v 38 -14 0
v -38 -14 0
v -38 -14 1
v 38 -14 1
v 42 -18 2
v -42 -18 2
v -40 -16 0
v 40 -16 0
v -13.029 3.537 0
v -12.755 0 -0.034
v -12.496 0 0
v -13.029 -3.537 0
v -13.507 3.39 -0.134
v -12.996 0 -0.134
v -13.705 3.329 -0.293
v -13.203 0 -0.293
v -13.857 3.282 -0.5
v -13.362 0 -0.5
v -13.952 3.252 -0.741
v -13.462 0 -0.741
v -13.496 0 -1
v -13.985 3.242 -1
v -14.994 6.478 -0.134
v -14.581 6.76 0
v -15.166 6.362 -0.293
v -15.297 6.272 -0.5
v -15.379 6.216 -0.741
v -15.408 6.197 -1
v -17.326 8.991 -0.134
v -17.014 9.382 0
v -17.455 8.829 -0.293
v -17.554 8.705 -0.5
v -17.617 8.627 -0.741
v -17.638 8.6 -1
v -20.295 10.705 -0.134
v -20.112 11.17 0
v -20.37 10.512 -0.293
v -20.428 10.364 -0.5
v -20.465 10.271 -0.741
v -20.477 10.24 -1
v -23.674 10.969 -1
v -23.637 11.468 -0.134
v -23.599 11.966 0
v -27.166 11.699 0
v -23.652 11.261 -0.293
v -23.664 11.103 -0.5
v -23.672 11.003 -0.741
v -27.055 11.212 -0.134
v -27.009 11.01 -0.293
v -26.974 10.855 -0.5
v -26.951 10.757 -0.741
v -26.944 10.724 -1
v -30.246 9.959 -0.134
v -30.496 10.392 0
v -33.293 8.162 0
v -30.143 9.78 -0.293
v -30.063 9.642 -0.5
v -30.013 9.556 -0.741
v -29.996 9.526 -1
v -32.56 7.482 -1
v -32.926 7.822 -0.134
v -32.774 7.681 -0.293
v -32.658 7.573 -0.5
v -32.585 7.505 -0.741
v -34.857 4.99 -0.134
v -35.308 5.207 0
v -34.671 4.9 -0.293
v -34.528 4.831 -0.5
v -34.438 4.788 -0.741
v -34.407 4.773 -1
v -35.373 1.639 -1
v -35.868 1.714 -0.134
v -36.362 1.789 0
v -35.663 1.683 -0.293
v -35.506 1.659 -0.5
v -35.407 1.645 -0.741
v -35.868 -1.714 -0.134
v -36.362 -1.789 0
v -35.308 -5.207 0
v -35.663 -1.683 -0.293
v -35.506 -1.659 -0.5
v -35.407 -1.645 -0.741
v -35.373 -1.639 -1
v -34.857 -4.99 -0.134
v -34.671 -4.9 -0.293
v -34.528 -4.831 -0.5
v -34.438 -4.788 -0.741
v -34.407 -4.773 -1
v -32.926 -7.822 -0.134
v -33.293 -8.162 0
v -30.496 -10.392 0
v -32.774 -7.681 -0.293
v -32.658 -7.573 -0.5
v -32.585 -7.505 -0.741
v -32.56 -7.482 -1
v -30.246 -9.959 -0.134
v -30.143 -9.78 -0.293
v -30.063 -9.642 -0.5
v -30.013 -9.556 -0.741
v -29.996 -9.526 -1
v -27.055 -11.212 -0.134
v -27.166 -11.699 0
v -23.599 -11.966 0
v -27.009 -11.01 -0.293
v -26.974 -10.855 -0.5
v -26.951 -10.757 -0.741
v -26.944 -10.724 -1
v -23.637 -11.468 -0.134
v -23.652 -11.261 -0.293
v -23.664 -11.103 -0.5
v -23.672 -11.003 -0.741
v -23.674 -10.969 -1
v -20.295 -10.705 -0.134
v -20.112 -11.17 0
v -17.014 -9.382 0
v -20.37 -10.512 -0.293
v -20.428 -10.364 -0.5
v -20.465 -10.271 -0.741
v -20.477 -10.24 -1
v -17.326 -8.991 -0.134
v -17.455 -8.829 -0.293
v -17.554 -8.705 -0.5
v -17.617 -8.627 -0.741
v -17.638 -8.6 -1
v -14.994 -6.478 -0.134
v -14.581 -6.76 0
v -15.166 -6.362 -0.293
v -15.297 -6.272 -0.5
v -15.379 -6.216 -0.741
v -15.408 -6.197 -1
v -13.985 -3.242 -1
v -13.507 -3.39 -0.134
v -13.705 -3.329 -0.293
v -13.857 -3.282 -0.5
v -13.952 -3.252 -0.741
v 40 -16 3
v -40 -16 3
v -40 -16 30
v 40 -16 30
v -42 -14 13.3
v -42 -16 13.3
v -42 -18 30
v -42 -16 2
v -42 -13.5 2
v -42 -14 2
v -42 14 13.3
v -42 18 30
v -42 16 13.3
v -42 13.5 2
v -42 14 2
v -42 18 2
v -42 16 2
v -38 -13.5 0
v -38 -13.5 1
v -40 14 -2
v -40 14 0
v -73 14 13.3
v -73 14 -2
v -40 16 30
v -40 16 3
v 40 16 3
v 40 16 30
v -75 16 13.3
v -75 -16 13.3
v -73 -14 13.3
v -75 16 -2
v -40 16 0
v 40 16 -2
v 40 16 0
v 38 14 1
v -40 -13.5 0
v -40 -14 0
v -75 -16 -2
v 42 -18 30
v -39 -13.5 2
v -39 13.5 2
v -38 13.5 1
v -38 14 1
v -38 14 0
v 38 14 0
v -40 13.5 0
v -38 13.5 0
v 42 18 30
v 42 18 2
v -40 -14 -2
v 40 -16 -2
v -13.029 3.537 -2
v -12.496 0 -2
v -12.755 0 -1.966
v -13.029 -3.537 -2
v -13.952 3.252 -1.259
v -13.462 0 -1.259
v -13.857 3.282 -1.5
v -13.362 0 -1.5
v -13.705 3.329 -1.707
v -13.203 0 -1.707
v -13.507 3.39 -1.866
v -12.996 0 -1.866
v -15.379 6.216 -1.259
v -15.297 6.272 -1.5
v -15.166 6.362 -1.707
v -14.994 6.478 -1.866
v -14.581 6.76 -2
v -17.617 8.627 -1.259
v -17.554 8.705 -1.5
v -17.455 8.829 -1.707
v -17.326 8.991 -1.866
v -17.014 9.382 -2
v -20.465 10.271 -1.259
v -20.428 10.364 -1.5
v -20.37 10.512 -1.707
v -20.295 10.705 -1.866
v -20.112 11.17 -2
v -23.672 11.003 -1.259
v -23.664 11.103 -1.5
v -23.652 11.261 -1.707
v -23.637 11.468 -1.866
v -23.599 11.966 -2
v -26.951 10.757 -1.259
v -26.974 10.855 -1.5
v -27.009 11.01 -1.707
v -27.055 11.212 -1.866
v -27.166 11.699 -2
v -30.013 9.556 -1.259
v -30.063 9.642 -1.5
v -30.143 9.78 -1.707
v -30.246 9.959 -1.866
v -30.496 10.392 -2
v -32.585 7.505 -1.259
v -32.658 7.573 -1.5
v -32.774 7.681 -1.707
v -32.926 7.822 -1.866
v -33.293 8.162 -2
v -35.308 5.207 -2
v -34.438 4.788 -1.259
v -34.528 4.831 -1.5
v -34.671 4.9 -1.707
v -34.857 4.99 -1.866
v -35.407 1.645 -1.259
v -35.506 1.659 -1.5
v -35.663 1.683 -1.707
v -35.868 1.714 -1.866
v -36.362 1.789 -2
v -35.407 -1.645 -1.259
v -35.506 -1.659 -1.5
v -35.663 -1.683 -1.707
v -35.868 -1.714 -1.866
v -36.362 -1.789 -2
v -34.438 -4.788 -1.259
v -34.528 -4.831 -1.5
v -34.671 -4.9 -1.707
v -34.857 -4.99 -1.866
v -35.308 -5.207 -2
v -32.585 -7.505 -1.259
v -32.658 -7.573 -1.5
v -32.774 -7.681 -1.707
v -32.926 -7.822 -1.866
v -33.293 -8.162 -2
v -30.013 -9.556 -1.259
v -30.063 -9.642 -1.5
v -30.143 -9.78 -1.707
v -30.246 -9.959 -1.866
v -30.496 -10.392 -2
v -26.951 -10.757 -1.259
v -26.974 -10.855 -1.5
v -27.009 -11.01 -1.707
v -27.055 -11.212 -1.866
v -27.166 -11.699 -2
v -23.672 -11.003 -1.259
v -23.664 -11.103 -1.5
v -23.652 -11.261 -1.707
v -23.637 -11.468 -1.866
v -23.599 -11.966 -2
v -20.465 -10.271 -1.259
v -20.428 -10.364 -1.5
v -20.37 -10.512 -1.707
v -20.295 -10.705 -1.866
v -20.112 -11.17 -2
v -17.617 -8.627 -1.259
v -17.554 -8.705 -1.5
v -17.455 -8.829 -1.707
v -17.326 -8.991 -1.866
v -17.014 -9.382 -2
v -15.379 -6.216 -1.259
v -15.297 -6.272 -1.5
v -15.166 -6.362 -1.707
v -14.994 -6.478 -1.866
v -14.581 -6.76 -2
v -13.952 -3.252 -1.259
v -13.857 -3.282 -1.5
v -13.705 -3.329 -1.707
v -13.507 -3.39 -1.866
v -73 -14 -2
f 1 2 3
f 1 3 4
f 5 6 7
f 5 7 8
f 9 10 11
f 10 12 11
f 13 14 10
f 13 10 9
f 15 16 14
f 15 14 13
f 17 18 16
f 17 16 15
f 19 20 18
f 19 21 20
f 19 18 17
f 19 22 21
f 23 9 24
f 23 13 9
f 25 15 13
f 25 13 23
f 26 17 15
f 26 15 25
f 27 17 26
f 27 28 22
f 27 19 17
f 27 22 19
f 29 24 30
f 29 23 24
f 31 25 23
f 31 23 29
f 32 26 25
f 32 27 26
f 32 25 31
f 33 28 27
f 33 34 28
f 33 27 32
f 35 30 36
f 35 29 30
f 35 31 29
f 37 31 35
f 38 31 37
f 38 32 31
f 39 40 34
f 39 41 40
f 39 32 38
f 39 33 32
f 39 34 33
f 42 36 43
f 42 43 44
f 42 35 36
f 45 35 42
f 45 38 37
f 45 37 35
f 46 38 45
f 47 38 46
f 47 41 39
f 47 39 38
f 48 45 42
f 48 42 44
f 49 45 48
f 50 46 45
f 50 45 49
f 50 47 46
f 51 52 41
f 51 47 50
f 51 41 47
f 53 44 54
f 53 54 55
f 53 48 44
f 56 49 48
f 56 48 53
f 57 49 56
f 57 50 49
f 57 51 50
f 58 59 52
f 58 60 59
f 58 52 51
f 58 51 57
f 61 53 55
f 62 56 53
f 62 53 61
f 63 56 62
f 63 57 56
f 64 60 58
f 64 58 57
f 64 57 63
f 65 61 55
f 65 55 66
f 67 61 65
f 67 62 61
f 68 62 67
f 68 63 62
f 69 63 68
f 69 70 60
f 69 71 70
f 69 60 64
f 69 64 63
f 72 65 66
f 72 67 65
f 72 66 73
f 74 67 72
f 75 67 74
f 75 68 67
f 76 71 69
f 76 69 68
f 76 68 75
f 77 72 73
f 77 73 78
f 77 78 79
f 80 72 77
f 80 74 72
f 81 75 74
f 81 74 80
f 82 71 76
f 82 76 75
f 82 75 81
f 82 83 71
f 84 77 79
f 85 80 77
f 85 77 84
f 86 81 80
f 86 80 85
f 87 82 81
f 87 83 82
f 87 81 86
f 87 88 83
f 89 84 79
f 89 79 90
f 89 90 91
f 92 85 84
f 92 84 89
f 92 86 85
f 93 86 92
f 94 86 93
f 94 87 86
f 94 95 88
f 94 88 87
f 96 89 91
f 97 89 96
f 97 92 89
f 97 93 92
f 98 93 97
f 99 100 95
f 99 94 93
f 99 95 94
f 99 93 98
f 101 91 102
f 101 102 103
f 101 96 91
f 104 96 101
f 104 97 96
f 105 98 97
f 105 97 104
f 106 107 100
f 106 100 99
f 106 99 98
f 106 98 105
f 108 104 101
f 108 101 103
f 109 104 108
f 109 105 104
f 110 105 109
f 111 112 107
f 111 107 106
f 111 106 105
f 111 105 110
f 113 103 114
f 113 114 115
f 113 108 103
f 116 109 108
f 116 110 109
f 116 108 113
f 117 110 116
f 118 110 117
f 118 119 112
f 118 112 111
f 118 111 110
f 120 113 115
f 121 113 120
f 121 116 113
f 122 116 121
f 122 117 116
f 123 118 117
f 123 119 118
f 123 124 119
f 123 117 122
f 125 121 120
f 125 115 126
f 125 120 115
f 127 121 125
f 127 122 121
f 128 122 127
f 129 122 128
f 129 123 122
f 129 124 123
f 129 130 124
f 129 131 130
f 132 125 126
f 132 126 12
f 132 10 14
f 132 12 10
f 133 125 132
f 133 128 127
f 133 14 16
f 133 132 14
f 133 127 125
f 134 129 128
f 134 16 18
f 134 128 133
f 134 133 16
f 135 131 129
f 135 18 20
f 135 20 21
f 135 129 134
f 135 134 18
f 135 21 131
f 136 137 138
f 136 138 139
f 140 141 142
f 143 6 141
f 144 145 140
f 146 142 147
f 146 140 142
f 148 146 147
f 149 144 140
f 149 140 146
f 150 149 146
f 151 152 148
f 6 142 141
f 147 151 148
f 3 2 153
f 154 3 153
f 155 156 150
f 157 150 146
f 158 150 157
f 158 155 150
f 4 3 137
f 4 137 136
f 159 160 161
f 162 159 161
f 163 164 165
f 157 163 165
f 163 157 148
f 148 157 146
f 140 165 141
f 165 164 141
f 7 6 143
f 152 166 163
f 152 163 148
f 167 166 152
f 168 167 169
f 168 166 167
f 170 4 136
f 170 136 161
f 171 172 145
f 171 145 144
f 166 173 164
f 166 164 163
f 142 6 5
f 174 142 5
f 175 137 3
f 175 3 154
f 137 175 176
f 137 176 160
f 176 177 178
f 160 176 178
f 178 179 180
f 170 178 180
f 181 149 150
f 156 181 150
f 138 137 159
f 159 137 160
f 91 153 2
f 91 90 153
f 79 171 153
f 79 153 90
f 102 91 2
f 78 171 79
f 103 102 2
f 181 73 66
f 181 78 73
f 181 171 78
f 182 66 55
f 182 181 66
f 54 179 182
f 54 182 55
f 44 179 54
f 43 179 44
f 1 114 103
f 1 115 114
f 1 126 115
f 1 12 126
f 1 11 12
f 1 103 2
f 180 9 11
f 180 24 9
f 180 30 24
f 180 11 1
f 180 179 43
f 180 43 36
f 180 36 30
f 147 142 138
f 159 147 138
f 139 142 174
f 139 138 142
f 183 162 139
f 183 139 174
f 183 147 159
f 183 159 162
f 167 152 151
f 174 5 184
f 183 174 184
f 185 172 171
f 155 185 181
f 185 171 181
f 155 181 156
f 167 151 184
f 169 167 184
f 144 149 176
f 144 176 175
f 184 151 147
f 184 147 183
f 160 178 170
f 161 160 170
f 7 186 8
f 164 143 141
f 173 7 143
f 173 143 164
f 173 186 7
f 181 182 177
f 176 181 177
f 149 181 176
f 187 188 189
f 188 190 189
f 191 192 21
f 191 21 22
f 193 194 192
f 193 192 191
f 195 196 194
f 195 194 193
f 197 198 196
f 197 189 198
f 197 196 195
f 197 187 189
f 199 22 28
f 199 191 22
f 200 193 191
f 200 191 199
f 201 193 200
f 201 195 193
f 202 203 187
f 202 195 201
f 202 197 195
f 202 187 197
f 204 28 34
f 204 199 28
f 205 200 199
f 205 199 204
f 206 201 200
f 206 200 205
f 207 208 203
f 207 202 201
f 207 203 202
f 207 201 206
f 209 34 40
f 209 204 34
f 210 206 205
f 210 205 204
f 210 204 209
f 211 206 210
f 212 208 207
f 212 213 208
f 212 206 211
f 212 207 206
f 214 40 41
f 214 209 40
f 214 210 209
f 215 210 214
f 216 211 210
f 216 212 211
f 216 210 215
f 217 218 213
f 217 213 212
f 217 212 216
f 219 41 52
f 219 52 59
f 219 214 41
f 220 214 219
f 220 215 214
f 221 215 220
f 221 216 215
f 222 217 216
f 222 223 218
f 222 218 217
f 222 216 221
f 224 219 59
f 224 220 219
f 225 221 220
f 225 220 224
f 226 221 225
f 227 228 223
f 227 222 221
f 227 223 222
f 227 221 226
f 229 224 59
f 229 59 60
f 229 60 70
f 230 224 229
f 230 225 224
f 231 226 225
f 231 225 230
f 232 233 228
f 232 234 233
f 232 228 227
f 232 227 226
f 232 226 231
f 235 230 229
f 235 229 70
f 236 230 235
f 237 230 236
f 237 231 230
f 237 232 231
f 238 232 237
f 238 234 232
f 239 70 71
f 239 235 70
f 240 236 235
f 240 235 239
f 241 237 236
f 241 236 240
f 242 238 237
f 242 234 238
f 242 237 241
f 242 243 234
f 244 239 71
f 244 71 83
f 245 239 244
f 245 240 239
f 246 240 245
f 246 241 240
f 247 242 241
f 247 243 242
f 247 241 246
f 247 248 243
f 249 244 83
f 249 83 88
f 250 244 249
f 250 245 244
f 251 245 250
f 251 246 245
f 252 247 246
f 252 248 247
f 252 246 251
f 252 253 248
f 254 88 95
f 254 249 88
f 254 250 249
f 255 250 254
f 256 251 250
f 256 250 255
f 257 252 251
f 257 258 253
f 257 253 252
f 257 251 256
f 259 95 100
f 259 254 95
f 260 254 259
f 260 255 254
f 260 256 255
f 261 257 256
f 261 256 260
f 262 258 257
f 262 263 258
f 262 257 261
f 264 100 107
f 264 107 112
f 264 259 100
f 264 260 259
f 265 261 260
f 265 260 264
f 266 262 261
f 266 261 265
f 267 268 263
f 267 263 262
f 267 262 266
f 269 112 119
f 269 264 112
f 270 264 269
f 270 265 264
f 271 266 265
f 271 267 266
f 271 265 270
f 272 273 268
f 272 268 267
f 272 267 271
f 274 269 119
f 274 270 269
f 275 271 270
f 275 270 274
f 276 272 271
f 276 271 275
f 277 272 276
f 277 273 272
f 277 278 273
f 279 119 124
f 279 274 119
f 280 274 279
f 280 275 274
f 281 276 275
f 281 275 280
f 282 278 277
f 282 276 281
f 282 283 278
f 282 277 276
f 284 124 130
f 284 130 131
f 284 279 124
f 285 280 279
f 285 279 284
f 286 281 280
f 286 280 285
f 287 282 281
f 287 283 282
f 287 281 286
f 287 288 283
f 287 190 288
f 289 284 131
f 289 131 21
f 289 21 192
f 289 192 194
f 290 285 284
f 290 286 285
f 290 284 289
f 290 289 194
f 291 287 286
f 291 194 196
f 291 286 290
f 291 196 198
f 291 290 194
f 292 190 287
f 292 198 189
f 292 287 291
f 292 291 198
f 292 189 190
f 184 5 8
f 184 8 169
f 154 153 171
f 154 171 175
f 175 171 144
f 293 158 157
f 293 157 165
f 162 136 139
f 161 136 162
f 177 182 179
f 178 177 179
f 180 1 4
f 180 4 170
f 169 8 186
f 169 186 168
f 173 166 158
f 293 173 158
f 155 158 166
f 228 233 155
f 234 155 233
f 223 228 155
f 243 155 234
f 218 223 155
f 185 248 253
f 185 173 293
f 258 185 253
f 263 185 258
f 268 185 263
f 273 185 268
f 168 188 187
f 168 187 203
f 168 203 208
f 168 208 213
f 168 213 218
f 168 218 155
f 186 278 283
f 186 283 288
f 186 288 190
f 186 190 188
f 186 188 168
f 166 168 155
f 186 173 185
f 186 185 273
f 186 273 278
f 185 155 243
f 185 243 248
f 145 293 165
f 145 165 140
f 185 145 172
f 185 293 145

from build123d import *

# Parameters (mm, degrees)
F0_W     = 84
F0_H     = 36
F0_W_2   = 80
F0_H_2   = 32
F1_DEPTH = 30
F0_W_3   = 76
F0_H_3   = 28
F2_DEPTH = 3
F0_R     = 11
F3_DEPTH = 2
F4_SIZE  = 1.99999
F5_SIZE  = 1.99999
F6_W     = 27
F6_H     = 1.99999
F7_DEPTH = 5
F9_DEPTH = 15.3
F10_R    = 0.99999


# Not quite as in the source:
# - a fillet or chamfer is up to 0.001 mm smaller than in the source, because OpenCascade refuses the exact size


with BuildPart() as f1:
    # F0 (on Top) → F1 (new body)
    with BuildSketch(Plane.XY):
        Rectangle(F0_W, F0_H)
        Rectangle(F0_W_2, F0_H_2, mode=Mode.SUBTRACT)
    extrude(amount=F1_DEPTH)

    # F0 (on Top) → F2 (join)
    with BuildSketch(Plane.XY):
        Rectangle(F0_W_2, F0_H_2)
        Rectangle(F0_W_3, F0_H_3, mode=Mode.SUBTRACT)
    extrude(amount=F2_DEPTH)

    # F0 (on Top) → F3 (join)
    with BuildSketch(Plane.XY):
        Rectangle(F0_W_2, F0_H_2)
        Rectangle(F0_W_3, F0_H_3, mode=Mode.SUBTRACT)
        Rectangle(F0_W_3, F0_H_3)
        with Locations((-24.4961753488, 0)):
            Circle(F0_R, mode=Mode.SUBTRACT)
    extrude(amount=-F3_DEPTH)

    # F4 (size 2 in the source; OpenCascade refuses exactly that, so slightly less here)
    f4_edges = [f1.edges().sort_by_distance(p)[0] for p in [
        (0, 18, 0),
        (0, -18, 0),
        (42, 0, 0),
        (-42, 0, 0),
    ]]
    chamfer(f4_edges, length=F4_SIZE)

    # F5 (size 2 in the source; OpenCascade refuses exactly that, so slightly less here)
    f5_edges = [f1.edges().sort_by_distance(p)[0] for p in [
        (0, -14, 3),
        (38, 0, 3),
        (0, 14, 3),
        (-38, 0, 3),
    ]]
    chamfer(f5_edges, length=F5_SIZE)

    # F6 (on face) → F7 (cut)
    with BuildSketch(Plane(origin=(-42, 0, 0), x_dir=(0, -1, 0), z_dir=(-1, 0, 0))):
        with Locations((0, 0.999995)):
            Rectangle(F6_W, F6_H)
    extrude(amount=-F7_DEPTH, mode=Mode.SUBTRACT)

    # F8 (on face) → F9 (join)
    with BuildSketch(Plane(origin=(0, 0, -2), x_dir=(1, 0, 0), z_dir=(0, 0, -1))):
        Polygon((-40, 14), (-40, 16), (-75, 16), (-75, -16), (-40, -16), (-40, -14), (-73, -14), (-73, 14), align=None)
    extrude(amount=-F9_DEPTH)

    # F10 (radius 1 in the source; OpenCascade refuses exactly that, so slightly less here)
    f10_edges = [f1.edges().sort_by_distance(p)[0] for p in [
        (-35.496175, 0, -2),
        (-35.496175, 0, 0),
    ]]
    fillet(f10_edges, radius=F10_R)


solid = f1.part
